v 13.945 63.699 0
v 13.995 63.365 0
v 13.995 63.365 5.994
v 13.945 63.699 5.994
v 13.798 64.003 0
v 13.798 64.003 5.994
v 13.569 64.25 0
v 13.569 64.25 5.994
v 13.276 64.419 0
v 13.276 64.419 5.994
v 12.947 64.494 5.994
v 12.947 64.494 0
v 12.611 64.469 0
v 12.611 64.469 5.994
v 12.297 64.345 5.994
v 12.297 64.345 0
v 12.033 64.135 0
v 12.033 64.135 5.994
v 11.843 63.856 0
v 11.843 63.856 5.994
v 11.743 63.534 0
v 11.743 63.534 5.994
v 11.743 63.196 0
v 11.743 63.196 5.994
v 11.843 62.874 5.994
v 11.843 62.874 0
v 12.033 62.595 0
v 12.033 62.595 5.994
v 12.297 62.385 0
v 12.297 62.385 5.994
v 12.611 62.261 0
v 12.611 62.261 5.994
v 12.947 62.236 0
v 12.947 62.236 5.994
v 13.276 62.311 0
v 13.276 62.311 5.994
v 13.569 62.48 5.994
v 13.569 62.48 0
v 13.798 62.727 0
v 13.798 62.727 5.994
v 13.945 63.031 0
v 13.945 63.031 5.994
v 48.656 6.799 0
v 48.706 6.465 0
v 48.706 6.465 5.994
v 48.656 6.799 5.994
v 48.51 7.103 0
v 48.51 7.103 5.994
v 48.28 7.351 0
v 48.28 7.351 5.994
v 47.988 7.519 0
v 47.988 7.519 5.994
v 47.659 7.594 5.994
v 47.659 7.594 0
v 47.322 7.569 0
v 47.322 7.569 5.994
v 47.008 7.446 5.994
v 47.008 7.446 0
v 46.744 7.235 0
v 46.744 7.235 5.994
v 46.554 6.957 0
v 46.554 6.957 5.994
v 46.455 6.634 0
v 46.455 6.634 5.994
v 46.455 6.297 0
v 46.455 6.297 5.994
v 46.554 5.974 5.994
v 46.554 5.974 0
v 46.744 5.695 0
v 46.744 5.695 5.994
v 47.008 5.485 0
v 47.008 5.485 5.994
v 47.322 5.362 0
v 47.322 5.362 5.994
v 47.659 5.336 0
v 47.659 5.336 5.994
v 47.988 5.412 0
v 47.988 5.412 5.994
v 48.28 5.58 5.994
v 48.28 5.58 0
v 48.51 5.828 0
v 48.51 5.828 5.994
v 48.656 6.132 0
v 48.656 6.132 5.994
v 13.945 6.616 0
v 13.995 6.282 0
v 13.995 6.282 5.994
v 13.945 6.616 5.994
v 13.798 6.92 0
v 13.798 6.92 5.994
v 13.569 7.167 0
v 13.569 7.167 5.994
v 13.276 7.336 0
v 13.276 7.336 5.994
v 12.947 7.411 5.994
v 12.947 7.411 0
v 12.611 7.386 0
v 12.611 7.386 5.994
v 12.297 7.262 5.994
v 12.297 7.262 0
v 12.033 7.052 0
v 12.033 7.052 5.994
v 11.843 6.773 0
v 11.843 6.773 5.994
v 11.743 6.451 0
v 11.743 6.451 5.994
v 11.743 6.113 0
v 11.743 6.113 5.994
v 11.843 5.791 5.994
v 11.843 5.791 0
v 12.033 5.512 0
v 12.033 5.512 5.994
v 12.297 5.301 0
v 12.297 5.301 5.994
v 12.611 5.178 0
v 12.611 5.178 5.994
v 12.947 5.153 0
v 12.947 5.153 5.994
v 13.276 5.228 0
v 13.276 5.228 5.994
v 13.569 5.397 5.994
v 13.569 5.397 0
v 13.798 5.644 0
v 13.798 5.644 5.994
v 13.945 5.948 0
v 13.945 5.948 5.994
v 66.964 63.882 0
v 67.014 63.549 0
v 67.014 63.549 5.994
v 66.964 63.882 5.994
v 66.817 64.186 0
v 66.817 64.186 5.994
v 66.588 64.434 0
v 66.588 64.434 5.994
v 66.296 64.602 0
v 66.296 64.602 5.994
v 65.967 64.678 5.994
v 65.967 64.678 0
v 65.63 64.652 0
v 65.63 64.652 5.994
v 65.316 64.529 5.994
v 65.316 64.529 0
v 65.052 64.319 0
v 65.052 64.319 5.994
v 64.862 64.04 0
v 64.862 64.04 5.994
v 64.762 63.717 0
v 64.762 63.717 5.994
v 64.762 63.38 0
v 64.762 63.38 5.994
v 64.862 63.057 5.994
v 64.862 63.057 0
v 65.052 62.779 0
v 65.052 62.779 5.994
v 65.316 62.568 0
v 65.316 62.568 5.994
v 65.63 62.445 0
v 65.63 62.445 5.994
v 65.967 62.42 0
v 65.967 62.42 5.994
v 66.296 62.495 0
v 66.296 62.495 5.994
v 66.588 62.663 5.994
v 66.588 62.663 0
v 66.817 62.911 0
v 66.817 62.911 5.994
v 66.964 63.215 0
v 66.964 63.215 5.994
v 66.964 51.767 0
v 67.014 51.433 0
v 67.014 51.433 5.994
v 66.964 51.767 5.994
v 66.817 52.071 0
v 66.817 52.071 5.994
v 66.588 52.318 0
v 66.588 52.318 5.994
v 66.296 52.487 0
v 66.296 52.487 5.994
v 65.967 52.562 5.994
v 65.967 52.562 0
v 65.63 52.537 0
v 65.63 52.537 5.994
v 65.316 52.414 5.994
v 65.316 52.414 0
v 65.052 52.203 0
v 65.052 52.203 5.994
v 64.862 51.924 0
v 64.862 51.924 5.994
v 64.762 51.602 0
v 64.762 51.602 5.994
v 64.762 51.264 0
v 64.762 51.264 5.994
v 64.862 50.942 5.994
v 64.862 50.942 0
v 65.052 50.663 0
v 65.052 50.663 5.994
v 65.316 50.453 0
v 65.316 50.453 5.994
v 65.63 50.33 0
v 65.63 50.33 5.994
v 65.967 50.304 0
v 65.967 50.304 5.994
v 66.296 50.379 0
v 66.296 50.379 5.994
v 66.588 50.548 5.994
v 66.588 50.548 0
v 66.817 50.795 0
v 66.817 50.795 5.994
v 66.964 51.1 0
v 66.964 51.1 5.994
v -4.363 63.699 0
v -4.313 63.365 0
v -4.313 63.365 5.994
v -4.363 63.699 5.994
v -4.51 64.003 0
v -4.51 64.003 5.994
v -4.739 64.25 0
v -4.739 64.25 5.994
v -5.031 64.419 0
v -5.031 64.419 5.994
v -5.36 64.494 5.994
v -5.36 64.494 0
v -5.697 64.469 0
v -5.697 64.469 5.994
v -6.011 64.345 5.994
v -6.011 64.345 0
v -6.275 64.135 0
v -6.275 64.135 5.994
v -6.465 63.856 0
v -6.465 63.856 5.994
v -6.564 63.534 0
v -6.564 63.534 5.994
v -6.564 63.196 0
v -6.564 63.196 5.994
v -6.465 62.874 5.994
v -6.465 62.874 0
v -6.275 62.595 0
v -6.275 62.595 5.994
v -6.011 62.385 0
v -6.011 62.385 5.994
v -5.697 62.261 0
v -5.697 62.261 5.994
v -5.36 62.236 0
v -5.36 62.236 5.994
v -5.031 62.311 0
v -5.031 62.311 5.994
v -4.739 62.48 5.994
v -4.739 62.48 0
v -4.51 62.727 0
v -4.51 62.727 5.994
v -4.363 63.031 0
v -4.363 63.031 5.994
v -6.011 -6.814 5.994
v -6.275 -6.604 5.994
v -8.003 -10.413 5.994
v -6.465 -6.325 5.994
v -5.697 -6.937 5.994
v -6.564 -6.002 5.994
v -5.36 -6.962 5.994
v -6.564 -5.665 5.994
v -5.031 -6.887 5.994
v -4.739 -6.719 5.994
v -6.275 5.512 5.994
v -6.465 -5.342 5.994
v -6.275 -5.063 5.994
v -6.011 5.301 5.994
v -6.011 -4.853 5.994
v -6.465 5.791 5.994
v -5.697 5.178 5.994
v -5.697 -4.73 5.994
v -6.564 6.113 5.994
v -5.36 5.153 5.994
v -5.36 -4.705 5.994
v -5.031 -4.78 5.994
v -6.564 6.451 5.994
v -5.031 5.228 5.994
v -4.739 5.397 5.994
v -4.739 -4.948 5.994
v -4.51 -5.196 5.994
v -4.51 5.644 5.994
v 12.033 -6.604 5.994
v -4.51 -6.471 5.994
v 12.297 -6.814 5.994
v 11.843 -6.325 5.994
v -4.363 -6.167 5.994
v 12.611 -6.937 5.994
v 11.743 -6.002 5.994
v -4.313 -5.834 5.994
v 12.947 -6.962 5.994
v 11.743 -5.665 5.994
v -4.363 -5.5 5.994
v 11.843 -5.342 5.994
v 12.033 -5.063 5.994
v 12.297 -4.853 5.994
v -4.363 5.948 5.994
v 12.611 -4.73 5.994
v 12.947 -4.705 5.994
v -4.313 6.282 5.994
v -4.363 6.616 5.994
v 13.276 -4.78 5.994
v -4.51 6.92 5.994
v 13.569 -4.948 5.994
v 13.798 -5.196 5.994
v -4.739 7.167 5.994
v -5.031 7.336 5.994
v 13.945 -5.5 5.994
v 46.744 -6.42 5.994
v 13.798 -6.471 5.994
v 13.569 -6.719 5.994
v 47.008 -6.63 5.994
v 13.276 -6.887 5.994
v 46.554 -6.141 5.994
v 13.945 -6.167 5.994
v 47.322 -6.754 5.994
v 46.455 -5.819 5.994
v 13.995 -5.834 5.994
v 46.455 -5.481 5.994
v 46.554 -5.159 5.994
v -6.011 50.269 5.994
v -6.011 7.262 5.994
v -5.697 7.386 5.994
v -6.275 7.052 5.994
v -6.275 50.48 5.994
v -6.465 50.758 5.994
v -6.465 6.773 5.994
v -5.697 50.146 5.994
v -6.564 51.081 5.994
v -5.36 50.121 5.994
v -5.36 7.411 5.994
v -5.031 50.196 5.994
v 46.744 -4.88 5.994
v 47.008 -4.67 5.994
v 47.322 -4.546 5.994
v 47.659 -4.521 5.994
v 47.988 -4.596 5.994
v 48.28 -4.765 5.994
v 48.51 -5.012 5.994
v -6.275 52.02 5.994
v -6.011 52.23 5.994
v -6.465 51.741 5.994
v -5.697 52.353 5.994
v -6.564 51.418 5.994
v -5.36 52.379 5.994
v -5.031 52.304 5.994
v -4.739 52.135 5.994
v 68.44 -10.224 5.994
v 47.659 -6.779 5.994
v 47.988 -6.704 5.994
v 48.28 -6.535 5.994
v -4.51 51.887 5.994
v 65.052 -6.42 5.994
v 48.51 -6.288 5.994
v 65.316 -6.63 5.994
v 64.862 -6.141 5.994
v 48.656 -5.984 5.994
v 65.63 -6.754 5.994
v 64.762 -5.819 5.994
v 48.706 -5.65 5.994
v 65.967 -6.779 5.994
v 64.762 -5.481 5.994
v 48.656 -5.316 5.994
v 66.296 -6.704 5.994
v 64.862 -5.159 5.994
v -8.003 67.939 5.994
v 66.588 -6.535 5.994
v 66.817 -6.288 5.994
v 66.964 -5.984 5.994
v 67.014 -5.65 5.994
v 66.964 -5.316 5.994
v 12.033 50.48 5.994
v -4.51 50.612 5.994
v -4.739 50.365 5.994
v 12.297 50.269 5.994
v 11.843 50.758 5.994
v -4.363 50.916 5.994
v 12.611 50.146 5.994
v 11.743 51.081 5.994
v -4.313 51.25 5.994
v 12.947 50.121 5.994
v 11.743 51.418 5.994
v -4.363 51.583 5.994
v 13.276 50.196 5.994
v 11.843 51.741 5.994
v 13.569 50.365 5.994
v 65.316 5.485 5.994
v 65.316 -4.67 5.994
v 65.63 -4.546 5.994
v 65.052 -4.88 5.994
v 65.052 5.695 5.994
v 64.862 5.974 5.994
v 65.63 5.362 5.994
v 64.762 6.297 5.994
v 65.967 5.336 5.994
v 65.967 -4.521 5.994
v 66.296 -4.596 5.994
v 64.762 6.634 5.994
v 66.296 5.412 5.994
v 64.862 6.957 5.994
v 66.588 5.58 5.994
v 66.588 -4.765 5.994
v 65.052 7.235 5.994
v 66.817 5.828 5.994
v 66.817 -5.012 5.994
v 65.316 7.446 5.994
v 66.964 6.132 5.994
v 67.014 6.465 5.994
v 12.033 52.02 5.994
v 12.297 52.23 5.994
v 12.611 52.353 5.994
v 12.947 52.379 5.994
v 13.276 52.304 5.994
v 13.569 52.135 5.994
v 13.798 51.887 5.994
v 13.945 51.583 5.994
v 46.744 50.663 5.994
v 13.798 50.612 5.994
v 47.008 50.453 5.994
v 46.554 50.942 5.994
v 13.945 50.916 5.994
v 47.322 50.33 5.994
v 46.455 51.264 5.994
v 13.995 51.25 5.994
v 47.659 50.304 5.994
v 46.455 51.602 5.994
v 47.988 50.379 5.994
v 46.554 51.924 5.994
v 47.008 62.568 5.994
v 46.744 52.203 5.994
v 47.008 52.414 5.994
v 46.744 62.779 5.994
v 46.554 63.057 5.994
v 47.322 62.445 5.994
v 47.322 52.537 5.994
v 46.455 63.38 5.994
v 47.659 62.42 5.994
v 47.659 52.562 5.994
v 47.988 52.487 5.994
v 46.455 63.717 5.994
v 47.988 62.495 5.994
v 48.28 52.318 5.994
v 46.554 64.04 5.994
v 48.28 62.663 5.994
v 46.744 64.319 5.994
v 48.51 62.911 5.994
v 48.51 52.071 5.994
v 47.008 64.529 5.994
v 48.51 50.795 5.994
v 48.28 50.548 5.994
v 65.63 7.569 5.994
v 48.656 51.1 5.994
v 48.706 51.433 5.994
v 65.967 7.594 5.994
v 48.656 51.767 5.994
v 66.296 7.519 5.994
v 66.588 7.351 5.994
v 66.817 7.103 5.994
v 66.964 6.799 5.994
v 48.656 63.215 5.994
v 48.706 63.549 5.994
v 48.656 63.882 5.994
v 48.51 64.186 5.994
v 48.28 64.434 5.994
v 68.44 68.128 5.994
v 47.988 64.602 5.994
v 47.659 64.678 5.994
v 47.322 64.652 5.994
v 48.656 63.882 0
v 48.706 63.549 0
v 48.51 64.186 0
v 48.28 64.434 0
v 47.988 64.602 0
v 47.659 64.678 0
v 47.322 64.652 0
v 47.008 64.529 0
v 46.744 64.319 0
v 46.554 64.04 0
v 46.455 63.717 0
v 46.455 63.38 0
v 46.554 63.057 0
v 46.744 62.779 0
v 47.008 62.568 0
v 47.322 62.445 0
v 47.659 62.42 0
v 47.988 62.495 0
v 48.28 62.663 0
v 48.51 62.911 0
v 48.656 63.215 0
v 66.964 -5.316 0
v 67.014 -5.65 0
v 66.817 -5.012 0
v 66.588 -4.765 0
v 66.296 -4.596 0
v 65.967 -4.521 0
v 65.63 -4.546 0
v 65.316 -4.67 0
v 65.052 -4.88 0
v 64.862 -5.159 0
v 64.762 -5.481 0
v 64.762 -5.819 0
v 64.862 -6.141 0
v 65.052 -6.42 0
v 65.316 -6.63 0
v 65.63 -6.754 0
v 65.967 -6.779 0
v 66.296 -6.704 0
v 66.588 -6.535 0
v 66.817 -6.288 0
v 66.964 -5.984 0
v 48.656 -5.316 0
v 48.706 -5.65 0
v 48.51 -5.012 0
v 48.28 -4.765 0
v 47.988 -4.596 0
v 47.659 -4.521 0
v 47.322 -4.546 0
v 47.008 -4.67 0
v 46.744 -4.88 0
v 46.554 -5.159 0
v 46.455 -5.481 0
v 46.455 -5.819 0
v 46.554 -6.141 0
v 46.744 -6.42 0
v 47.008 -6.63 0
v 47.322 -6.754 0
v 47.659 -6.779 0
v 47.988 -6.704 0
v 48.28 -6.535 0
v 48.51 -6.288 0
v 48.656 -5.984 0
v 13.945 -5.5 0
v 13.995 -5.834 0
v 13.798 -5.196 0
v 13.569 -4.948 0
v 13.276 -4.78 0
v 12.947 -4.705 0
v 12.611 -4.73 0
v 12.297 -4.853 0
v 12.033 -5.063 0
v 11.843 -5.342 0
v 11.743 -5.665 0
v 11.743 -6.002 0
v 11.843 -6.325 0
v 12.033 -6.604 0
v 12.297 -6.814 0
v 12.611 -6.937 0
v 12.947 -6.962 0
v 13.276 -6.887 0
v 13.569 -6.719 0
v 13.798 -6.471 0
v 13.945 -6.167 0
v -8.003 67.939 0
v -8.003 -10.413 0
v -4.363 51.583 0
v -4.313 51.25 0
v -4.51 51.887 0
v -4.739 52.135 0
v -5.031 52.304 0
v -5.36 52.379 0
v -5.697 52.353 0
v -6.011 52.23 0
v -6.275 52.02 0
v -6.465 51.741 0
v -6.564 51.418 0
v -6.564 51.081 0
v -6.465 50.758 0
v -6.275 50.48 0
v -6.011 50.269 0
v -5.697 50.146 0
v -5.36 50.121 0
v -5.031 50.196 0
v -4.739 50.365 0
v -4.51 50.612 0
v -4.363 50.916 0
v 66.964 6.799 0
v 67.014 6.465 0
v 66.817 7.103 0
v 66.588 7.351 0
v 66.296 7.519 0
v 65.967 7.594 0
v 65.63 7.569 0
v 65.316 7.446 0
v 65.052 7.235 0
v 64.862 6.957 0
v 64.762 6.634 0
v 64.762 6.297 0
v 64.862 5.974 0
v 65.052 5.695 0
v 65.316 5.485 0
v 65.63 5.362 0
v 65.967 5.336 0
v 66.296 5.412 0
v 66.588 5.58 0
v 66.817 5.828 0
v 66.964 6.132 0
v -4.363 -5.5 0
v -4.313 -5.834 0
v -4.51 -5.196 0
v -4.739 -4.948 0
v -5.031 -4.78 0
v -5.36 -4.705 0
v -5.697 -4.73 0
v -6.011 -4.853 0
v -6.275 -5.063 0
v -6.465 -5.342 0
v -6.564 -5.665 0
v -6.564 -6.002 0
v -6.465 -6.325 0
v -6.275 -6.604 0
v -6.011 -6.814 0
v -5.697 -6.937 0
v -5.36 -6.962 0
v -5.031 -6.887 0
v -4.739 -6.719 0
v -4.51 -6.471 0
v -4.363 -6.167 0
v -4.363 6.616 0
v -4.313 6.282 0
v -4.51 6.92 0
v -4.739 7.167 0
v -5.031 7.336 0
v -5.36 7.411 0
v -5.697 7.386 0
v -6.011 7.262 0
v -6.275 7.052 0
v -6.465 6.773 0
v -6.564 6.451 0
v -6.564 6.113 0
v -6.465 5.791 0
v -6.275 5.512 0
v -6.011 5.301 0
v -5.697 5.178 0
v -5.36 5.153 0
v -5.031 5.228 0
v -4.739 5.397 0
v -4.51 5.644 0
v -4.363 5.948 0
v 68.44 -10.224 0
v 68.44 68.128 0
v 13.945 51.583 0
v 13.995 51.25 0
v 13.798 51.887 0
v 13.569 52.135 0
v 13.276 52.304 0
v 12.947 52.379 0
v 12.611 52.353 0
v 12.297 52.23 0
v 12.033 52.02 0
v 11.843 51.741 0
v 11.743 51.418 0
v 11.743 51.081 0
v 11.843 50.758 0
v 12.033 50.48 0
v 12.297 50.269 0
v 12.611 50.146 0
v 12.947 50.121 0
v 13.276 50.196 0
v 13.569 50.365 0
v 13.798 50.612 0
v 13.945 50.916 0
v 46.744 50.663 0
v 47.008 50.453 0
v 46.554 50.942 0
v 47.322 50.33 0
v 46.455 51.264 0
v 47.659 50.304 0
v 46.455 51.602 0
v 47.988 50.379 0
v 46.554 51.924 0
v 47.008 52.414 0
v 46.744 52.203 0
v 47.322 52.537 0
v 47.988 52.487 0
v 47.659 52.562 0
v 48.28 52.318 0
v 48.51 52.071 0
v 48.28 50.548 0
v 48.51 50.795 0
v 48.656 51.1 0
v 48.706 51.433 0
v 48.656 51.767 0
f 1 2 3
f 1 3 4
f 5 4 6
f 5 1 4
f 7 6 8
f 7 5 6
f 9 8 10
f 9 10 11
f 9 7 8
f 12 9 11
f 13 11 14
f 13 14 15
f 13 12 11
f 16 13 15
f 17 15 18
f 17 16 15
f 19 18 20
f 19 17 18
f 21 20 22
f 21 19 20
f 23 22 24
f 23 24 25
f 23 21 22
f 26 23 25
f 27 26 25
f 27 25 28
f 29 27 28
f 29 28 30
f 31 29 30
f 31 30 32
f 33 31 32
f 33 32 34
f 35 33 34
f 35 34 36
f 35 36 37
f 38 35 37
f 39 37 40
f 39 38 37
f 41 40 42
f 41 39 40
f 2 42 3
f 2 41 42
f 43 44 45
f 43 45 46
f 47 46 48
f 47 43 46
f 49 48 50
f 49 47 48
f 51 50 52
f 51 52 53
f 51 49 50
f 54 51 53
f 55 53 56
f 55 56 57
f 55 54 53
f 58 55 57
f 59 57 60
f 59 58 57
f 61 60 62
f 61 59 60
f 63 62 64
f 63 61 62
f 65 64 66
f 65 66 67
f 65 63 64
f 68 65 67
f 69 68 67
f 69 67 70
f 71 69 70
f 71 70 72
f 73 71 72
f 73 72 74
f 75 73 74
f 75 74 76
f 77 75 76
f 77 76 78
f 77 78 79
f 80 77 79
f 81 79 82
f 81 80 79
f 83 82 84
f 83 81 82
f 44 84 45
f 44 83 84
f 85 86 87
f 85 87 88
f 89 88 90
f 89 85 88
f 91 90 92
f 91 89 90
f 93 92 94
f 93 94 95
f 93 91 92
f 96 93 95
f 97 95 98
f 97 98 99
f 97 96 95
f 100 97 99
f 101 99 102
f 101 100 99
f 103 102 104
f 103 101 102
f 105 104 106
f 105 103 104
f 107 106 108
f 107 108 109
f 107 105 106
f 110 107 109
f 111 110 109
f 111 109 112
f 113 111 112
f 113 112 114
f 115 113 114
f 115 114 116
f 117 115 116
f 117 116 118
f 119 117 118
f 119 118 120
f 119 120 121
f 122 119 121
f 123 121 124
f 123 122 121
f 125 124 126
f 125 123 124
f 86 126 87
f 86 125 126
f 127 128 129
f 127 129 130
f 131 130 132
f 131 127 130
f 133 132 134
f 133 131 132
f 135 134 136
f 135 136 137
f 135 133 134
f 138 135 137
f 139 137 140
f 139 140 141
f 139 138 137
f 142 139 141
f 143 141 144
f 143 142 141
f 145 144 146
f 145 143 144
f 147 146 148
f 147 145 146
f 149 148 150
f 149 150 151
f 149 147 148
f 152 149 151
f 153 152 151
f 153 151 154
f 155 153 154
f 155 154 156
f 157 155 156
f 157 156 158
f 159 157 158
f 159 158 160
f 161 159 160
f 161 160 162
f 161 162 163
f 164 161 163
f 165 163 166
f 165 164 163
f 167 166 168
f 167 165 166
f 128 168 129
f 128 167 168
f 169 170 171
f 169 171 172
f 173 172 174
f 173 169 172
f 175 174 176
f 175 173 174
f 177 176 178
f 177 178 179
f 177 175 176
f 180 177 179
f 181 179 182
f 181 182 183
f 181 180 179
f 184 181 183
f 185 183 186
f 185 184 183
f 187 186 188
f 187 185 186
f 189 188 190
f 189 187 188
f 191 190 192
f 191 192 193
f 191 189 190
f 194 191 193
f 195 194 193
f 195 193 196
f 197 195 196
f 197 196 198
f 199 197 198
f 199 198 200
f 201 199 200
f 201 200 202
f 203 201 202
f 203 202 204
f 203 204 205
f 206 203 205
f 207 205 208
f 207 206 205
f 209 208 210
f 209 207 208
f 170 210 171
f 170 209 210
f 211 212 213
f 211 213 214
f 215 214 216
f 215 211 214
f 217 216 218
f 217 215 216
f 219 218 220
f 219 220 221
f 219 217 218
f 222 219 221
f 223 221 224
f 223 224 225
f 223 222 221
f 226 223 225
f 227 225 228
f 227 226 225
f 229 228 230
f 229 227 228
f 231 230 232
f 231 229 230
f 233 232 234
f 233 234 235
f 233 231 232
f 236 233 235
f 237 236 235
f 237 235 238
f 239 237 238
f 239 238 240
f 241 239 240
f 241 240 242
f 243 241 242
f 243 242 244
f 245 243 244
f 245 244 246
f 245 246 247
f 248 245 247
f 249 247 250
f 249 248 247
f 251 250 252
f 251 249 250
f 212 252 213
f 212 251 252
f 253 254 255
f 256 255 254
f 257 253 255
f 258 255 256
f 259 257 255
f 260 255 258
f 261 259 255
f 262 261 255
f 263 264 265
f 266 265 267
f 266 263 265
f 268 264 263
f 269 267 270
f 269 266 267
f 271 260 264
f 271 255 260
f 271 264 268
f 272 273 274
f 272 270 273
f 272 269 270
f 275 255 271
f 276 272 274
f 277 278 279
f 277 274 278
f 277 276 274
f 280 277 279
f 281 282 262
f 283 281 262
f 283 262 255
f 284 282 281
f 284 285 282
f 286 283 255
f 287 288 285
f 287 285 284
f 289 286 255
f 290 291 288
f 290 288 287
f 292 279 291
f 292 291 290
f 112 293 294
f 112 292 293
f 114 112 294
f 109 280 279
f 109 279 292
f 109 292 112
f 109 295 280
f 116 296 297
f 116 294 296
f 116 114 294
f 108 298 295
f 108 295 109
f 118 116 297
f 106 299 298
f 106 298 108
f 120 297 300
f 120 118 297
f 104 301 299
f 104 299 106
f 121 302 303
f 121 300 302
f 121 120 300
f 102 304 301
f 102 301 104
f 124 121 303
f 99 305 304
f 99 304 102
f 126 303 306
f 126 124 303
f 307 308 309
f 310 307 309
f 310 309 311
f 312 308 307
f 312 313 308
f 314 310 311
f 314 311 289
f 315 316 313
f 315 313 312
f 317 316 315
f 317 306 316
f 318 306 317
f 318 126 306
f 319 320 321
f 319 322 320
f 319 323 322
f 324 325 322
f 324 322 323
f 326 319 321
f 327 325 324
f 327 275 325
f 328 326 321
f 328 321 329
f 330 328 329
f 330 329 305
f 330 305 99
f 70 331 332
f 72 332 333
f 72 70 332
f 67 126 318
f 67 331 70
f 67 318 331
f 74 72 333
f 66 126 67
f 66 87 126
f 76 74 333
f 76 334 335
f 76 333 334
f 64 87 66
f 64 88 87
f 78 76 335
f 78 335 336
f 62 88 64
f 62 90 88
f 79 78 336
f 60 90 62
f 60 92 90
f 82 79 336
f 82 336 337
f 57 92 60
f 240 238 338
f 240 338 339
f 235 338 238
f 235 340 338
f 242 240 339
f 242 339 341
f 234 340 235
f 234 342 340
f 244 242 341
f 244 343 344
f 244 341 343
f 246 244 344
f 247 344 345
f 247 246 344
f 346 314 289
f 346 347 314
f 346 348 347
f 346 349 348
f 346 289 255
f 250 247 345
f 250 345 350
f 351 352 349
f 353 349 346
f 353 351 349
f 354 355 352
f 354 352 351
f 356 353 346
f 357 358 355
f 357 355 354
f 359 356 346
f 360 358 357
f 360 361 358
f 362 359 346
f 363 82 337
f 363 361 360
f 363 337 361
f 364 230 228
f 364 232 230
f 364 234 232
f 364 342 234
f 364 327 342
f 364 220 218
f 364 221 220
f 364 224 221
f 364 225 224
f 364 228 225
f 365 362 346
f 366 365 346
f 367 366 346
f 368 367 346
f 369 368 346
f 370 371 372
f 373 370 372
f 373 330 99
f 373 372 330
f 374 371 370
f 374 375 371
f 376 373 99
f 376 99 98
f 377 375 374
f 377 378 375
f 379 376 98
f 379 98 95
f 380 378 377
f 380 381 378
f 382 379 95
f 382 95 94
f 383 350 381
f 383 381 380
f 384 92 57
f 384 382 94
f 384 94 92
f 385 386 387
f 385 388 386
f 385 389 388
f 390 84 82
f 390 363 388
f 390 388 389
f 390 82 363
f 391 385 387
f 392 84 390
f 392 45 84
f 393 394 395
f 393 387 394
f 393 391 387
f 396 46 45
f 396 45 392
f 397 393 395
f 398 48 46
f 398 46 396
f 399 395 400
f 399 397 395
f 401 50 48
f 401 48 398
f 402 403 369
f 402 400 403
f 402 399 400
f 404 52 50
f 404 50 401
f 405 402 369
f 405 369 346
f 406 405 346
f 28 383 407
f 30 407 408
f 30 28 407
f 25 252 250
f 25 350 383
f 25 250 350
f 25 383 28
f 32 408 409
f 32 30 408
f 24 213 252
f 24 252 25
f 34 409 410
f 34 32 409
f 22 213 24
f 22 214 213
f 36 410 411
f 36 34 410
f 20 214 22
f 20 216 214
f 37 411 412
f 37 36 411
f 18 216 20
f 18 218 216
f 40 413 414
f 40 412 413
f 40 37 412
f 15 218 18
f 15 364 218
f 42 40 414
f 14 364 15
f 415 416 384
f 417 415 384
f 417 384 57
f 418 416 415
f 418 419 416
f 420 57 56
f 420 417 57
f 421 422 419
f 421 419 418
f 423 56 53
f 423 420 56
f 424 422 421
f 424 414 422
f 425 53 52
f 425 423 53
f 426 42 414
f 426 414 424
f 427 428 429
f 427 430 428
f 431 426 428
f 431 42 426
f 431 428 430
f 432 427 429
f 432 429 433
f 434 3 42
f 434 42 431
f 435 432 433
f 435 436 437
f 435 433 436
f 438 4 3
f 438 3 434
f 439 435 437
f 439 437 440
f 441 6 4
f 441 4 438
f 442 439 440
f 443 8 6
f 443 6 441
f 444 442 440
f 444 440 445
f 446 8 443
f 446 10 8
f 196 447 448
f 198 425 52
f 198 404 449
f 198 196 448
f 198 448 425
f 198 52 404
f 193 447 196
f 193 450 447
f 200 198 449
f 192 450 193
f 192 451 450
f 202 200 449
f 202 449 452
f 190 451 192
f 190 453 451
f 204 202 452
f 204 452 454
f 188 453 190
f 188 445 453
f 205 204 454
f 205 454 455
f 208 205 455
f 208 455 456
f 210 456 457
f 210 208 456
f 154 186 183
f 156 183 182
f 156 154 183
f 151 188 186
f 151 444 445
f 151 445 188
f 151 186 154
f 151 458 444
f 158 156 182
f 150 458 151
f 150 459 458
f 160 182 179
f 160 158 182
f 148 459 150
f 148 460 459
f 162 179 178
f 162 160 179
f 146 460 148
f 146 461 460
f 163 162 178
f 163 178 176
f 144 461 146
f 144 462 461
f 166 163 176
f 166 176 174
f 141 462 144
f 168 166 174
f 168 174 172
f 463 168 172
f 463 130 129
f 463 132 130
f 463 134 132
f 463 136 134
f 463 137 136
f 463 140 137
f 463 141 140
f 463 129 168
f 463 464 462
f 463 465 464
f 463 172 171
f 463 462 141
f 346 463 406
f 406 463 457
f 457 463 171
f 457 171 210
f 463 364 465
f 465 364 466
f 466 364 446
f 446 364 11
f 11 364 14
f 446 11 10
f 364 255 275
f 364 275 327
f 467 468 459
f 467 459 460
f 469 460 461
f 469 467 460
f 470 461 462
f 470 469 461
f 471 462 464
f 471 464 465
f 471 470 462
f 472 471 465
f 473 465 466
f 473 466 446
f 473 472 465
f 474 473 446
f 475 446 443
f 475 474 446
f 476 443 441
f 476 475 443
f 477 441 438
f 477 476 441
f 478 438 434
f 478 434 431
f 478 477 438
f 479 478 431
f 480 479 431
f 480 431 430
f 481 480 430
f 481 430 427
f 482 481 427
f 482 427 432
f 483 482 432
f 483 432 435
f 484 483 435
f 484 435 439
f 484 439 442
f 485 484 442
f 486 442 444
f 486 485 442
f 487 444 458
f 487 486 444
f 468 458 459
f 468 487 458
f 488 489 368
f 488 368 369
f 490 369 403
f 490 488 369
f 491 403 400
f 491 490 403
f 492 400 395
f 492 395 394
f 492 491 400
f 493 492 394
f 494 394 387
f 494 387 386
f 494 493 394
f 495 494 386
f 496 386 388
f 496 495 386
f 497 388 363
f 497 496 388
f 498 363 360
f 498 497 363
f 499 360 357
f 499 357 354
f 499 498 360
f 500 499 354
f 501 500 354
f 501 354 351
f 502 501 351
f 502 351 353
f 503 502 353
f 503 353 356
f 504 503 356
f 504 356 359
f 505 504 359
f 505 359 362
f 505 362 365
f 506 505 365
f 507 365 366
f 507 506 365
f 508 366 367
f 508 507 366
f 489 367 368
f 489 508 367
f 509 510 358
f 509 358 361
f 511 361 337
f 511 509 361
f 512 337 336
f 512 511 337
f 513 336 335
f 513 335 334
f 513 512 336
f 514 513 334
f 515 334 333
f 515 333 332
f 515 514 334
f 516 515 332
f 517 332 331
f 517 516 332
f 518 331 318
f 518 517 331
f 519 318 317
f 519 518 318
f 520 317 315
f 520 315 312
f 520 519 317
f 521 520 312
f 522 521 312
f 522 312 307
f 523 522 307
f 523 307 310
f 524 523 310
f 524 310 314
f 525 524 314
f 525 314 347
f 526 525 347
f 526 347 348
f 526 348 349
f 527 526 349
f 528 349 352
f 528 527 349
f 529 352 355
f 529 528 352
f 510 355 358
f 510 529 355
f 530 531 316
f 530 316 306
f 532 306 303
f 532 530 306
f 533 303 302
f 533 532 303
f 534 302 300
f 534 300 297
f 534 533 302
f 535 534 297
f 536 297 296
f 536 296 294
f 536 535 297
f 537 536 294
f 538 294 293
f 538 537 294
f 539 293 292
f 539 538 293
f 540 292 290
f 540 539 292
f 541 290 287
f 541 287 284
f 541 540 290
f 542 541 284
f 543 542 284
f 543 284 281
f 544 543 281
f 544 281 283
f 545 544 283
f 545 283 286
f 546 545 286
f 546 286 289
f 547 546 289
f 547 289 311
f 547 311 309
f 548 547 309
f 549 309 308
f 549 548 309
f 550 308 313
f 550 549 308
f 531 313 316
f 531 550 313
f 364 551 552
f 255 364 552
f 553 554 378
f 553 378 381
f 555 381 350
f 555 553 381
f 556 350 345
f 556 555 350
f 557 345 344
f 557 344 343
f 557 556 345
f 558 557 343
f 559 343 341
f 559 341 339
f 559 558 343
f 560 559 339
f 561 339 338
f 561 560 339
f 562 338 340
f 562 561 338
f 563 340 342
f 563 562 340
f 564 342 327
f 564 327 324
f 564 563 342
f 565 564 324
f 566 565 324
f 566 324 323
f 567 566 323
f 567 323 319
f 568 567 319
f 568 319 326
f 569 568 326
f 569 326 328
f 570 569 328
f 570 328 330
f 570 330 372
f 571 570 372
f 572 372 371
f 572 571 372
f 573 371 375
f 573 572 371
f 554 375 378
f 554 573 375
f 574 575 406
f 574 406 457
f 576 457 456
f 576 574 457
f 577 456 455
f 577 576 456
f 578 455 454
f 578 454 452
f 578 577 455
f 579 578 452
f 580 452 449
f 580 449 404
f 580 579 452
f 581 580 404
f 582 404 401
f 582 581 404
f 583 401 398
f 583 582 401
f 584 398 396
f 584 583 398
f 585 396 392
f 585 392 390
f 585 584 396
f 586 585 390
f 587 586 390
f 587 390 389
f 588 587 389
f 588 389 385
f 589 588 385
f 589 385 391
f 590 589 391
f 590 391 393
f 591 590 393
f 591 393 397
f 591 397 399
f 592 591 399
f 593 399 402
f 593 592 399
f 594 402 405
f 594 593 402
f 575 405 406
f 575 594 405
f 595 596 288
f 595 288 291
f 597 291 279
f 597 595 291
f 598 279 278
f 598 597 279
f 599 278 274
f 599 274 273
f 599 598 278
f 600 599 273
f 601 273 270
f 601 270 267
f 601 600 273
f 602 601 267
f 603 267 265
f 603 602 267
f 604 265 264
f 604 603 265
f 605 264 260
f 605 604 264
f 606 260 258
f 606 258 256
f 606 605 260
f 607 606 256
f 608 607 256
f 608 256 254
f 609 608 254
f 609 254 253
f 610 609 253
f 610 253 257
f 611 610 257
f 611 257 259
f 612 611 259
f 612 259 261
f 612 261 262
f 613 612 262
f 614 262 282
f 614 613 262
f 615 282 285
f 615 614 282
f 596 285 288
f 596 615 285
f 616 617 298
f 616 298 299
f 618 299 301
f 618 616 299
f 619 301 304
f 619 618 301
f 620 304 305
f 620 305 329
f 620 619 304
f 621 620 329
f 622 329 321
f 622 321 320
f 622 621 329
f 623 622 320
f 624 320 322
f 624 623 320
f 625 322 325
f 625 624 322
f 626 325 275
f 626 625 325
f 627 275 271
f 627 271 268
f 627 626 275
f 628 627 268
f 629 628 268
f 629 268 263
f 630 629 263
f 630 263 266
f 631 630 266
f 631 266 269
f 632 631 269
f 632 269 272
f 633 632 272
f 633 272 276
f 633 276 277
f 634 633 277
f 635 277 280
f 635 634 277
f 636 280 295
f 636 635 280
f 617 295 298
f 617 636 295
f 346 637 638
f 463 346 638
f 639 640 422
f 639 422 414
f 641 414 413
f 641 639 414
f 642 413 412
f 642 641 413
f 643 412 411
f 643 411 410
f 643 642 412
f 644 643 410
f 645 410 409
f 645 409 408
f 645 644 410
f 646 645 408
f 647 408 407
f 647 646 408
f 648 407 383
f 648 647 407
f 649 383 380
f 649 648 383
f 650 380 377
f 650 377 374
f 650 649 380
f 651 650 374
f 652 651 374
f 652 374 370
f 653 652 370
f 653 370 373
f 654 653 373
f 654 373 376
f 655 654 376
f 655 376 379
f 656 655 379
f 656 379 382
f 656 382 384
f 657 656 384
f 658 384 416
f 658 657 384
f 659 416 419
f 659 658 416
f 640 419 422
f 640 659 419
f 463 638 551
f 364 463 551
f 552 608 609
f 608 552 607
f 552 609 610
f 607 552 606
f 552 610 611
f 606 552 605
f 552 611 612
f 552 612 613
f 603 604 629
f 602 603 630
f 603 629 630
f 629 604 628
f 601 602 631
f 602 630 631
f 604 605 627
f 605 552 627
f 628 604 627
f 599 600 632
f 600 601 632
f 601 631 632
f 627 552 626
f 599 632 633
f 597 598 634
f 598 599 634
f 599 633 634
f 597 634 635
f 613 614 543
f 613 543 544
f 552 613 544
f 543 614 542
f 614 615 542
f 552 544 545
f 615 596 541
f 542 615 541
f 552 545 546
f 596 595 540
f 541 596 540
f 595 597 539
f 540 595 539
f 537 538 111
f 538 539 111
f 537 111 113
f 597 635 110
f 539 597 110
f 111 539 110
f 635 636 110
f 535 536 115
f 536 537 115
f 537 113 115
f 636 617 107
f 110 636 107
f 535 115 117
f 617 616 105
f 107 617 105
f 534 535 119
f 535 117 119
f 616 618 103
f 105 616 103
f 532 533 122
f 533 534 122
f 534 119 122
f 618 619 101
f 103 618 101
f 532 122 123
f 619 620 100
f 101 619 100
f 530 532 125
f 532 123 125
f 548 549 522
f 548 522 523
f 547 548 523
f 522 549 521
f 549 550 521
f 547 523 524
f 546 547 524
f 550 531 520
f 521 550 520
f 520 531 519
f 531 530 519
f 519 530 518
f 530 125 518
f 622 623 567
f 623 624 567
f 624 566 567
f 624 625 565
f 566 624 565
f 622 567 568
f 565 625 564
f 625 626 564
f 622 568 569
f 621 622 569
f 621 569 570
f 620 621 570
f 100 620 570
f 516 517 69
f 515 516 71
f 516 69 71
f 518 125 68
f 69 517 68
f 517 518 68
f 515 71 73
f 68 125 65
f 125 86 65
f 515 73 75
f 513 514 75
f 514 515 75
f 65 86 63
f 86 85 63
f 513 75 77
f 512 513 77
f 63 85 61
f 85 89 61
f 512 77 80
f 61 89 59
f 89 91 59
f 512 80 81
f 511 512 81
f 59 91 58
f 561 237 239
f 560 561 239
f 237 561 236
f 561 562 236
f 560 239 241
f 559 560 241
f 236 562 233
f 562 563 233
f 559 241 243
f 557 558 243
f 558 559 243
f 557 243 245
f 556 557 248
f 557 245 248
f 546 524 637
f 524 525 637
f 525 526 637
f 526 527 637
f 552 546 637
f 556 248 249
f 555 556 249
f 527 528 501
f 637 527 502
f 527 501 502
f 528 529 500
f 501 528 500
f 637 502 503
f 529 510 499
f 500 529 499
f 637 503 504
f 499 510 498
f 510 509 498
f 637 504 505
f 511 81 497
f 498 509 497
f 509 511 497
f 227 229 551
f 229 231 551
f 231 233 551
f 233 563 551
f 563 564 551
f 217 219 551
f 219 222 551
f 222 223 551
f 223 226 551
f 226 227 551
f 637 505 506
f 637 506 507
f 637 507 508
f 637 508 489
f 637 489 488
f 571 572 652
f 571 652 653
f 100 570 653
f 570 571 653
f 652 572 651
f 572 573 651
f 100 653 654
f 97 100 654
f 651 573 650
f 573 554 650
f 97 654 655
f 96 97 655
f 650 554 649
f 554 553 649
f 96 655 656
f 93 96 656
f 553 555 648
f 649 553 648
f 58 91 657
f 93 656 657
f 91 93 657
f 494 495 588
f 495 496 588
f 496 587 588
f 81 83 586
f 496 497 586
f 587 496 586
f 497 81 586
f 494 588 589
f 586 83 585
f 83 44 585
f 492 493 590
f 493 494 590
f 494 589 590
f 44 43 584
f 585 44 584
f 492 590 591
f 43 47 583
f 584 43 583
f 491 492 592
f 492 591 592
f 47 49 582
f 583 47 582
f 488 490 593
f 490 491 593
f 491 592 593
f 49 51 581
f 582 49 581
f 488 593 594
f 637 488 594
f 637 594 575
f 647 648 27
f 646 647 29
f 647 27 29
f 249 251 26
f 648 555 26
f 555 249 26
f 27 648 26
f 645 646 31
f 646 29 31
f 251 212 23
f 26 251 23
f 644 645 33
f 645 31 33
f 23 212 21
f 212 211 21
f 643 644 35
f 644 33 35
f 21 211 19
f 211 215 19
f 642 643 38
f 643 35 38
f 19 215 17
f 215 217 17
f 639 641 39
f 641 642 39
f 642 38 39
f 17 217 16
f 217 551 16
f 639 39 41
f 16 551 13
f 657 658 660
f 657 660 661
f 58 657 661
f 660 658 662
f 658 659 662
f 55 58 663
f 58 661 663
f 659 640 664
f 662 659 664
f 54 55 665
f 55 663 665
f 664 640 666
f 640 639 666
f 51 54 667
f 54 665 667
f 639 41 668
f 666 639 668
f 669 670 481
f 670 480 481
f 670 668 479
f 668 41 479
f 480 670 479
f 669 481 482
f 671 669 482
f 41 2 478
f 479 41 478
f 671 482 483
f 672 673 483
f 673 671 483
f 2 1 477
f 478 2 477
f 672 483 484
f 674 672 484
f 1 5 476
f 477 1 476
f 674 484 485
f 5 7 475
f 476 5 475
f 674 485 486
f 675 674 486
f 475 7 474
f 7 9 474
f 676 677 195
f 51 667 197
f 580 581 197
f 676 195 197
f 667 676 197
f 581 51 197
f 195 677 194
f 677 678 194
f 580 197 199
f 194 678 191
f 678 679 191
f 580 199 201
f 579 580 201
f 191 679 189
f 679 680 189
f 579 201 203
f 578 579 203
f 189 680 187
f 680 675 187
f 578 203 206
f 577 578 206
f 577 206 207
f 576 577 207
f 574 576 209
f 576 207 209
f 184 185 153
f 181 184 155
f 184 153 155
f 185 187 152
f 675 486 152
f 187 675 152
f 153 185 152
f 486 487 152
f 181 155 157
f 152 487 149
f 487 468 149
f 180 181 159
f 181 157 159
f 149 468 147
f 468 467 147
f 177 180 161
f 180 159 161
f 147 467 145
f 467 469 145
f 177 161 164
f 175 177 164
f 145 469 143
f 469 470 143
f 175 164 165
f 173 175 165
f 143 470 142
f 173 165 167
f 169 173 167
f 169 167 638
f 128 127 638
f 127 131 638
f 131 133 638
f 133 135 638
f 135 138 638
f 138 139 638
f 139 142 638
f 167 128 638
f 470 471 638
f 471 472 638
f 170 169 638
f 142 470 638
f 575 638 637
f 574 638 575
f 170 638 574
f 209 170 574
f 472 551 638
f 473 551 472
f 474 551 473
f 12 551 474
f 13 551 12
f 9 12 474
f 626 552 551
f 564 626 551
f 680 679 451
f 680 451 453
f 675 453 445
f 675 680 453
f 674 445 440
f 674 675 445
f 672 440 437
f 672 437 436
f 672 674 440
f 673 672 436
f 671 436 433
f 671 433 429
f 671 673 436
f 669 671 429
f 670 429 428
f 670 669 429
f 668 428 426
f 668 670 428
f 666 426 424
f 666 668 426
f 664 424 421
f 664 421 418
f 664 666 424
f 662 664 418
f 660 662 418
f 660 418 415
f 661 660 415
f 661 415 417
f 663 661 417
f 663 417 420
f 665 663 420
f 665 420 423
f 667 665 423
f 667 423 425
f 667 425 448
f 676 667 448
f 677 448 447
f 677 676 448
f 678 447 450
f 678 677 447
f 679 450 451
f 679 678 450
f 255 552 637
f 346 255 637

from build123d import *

# Parameters (mm, degrees)
SKETCH1_R           = 1.13211215
BOSS_EXTRUDE1_DEPTH = 5.9944


with BuildPart() as part:
    # Sketch1 → Boss-Extrude1 (new body)
    with BuildSketch(Plane.XY):
        Polygon((68.439590063, -10.224157235), (68.439590063, 68.128182765), (-8.002589937, 67.93922998), (-8.002589937, -10.41311002), align=None)
        with Locations((-5.444904937, -5.83350772)):
            Circle(SKETCH1_R, mode=Mode.SUBTRACT)
        with Locations((-5.444904937, 6.28184228)):
            Circle(SKETCH1_R, mode=Mode.SUBTRACT)
        with Locations((12.862735063, 6.28184228)):
            Circle(SKETCH1_R, mode=Mode.SUBTRACT)
        with Locations((12.862735063, -5.83350772)):
            Circle(SKETCH1_R, mode=Mode.SUBTRACT)
        with Locations((47.574265063, -5.649939535)):
            Circle(SKETCH1_R, mode=Mode.SUBTRACT)
        with Locations((47.574265063, 6.465410465)):
            Circle(SKETCH1_R, mode=Mode.SUBTRACT)
        with Locations((65.881905063, 6.465410465)):
            Circle(SKETCH1_R, mode=Mode.SUBTRACT)
        with Locations((65.881905063, -5.649939535)):
            Circle(SKETCH1_R, mode=Mode.SUBTRACT)
        with Locations((47.574265063, 51.433230465)):
            Circle(SKETCH1_R, mode=Mode.SUBTRACT)
        with Locations((47.574265063, 63.548580465)):
            Circle(SKETCH1_R, mode=Mode.SUBTRACT)
        with Locations((65.881905063, 63.548580465)):
            Circle(SKETCH1_R, mode=Mode.SUBTRACT)
        with Locations((65.881905063, 51.433230465)):
            Circle(SKETCH1_R, mode=Mode.SUBTRACT)
        with Locations((12.862735063, 51.24966228)):
            Circle(SKETCH1_R, mode=Mode.SUBTRACT)
        with Locations((12.862735063, 63.36501228)):
            Circle(SKETCH1_R, mode=Mode.SUBTRACT)
        with Locations((-5.444904937, 63.36501228)):
            Circle(SKETCH1_R, mode=Mode.SUBTRACT)
        with Locations((-5.444904937, 51.24966228)):
            Circle(SKETCH1_R, mode=Mode.SUBTRACT)
    extrude(amount=BOSS_EXTRUDE1_DEPTH)


solid = part.part
